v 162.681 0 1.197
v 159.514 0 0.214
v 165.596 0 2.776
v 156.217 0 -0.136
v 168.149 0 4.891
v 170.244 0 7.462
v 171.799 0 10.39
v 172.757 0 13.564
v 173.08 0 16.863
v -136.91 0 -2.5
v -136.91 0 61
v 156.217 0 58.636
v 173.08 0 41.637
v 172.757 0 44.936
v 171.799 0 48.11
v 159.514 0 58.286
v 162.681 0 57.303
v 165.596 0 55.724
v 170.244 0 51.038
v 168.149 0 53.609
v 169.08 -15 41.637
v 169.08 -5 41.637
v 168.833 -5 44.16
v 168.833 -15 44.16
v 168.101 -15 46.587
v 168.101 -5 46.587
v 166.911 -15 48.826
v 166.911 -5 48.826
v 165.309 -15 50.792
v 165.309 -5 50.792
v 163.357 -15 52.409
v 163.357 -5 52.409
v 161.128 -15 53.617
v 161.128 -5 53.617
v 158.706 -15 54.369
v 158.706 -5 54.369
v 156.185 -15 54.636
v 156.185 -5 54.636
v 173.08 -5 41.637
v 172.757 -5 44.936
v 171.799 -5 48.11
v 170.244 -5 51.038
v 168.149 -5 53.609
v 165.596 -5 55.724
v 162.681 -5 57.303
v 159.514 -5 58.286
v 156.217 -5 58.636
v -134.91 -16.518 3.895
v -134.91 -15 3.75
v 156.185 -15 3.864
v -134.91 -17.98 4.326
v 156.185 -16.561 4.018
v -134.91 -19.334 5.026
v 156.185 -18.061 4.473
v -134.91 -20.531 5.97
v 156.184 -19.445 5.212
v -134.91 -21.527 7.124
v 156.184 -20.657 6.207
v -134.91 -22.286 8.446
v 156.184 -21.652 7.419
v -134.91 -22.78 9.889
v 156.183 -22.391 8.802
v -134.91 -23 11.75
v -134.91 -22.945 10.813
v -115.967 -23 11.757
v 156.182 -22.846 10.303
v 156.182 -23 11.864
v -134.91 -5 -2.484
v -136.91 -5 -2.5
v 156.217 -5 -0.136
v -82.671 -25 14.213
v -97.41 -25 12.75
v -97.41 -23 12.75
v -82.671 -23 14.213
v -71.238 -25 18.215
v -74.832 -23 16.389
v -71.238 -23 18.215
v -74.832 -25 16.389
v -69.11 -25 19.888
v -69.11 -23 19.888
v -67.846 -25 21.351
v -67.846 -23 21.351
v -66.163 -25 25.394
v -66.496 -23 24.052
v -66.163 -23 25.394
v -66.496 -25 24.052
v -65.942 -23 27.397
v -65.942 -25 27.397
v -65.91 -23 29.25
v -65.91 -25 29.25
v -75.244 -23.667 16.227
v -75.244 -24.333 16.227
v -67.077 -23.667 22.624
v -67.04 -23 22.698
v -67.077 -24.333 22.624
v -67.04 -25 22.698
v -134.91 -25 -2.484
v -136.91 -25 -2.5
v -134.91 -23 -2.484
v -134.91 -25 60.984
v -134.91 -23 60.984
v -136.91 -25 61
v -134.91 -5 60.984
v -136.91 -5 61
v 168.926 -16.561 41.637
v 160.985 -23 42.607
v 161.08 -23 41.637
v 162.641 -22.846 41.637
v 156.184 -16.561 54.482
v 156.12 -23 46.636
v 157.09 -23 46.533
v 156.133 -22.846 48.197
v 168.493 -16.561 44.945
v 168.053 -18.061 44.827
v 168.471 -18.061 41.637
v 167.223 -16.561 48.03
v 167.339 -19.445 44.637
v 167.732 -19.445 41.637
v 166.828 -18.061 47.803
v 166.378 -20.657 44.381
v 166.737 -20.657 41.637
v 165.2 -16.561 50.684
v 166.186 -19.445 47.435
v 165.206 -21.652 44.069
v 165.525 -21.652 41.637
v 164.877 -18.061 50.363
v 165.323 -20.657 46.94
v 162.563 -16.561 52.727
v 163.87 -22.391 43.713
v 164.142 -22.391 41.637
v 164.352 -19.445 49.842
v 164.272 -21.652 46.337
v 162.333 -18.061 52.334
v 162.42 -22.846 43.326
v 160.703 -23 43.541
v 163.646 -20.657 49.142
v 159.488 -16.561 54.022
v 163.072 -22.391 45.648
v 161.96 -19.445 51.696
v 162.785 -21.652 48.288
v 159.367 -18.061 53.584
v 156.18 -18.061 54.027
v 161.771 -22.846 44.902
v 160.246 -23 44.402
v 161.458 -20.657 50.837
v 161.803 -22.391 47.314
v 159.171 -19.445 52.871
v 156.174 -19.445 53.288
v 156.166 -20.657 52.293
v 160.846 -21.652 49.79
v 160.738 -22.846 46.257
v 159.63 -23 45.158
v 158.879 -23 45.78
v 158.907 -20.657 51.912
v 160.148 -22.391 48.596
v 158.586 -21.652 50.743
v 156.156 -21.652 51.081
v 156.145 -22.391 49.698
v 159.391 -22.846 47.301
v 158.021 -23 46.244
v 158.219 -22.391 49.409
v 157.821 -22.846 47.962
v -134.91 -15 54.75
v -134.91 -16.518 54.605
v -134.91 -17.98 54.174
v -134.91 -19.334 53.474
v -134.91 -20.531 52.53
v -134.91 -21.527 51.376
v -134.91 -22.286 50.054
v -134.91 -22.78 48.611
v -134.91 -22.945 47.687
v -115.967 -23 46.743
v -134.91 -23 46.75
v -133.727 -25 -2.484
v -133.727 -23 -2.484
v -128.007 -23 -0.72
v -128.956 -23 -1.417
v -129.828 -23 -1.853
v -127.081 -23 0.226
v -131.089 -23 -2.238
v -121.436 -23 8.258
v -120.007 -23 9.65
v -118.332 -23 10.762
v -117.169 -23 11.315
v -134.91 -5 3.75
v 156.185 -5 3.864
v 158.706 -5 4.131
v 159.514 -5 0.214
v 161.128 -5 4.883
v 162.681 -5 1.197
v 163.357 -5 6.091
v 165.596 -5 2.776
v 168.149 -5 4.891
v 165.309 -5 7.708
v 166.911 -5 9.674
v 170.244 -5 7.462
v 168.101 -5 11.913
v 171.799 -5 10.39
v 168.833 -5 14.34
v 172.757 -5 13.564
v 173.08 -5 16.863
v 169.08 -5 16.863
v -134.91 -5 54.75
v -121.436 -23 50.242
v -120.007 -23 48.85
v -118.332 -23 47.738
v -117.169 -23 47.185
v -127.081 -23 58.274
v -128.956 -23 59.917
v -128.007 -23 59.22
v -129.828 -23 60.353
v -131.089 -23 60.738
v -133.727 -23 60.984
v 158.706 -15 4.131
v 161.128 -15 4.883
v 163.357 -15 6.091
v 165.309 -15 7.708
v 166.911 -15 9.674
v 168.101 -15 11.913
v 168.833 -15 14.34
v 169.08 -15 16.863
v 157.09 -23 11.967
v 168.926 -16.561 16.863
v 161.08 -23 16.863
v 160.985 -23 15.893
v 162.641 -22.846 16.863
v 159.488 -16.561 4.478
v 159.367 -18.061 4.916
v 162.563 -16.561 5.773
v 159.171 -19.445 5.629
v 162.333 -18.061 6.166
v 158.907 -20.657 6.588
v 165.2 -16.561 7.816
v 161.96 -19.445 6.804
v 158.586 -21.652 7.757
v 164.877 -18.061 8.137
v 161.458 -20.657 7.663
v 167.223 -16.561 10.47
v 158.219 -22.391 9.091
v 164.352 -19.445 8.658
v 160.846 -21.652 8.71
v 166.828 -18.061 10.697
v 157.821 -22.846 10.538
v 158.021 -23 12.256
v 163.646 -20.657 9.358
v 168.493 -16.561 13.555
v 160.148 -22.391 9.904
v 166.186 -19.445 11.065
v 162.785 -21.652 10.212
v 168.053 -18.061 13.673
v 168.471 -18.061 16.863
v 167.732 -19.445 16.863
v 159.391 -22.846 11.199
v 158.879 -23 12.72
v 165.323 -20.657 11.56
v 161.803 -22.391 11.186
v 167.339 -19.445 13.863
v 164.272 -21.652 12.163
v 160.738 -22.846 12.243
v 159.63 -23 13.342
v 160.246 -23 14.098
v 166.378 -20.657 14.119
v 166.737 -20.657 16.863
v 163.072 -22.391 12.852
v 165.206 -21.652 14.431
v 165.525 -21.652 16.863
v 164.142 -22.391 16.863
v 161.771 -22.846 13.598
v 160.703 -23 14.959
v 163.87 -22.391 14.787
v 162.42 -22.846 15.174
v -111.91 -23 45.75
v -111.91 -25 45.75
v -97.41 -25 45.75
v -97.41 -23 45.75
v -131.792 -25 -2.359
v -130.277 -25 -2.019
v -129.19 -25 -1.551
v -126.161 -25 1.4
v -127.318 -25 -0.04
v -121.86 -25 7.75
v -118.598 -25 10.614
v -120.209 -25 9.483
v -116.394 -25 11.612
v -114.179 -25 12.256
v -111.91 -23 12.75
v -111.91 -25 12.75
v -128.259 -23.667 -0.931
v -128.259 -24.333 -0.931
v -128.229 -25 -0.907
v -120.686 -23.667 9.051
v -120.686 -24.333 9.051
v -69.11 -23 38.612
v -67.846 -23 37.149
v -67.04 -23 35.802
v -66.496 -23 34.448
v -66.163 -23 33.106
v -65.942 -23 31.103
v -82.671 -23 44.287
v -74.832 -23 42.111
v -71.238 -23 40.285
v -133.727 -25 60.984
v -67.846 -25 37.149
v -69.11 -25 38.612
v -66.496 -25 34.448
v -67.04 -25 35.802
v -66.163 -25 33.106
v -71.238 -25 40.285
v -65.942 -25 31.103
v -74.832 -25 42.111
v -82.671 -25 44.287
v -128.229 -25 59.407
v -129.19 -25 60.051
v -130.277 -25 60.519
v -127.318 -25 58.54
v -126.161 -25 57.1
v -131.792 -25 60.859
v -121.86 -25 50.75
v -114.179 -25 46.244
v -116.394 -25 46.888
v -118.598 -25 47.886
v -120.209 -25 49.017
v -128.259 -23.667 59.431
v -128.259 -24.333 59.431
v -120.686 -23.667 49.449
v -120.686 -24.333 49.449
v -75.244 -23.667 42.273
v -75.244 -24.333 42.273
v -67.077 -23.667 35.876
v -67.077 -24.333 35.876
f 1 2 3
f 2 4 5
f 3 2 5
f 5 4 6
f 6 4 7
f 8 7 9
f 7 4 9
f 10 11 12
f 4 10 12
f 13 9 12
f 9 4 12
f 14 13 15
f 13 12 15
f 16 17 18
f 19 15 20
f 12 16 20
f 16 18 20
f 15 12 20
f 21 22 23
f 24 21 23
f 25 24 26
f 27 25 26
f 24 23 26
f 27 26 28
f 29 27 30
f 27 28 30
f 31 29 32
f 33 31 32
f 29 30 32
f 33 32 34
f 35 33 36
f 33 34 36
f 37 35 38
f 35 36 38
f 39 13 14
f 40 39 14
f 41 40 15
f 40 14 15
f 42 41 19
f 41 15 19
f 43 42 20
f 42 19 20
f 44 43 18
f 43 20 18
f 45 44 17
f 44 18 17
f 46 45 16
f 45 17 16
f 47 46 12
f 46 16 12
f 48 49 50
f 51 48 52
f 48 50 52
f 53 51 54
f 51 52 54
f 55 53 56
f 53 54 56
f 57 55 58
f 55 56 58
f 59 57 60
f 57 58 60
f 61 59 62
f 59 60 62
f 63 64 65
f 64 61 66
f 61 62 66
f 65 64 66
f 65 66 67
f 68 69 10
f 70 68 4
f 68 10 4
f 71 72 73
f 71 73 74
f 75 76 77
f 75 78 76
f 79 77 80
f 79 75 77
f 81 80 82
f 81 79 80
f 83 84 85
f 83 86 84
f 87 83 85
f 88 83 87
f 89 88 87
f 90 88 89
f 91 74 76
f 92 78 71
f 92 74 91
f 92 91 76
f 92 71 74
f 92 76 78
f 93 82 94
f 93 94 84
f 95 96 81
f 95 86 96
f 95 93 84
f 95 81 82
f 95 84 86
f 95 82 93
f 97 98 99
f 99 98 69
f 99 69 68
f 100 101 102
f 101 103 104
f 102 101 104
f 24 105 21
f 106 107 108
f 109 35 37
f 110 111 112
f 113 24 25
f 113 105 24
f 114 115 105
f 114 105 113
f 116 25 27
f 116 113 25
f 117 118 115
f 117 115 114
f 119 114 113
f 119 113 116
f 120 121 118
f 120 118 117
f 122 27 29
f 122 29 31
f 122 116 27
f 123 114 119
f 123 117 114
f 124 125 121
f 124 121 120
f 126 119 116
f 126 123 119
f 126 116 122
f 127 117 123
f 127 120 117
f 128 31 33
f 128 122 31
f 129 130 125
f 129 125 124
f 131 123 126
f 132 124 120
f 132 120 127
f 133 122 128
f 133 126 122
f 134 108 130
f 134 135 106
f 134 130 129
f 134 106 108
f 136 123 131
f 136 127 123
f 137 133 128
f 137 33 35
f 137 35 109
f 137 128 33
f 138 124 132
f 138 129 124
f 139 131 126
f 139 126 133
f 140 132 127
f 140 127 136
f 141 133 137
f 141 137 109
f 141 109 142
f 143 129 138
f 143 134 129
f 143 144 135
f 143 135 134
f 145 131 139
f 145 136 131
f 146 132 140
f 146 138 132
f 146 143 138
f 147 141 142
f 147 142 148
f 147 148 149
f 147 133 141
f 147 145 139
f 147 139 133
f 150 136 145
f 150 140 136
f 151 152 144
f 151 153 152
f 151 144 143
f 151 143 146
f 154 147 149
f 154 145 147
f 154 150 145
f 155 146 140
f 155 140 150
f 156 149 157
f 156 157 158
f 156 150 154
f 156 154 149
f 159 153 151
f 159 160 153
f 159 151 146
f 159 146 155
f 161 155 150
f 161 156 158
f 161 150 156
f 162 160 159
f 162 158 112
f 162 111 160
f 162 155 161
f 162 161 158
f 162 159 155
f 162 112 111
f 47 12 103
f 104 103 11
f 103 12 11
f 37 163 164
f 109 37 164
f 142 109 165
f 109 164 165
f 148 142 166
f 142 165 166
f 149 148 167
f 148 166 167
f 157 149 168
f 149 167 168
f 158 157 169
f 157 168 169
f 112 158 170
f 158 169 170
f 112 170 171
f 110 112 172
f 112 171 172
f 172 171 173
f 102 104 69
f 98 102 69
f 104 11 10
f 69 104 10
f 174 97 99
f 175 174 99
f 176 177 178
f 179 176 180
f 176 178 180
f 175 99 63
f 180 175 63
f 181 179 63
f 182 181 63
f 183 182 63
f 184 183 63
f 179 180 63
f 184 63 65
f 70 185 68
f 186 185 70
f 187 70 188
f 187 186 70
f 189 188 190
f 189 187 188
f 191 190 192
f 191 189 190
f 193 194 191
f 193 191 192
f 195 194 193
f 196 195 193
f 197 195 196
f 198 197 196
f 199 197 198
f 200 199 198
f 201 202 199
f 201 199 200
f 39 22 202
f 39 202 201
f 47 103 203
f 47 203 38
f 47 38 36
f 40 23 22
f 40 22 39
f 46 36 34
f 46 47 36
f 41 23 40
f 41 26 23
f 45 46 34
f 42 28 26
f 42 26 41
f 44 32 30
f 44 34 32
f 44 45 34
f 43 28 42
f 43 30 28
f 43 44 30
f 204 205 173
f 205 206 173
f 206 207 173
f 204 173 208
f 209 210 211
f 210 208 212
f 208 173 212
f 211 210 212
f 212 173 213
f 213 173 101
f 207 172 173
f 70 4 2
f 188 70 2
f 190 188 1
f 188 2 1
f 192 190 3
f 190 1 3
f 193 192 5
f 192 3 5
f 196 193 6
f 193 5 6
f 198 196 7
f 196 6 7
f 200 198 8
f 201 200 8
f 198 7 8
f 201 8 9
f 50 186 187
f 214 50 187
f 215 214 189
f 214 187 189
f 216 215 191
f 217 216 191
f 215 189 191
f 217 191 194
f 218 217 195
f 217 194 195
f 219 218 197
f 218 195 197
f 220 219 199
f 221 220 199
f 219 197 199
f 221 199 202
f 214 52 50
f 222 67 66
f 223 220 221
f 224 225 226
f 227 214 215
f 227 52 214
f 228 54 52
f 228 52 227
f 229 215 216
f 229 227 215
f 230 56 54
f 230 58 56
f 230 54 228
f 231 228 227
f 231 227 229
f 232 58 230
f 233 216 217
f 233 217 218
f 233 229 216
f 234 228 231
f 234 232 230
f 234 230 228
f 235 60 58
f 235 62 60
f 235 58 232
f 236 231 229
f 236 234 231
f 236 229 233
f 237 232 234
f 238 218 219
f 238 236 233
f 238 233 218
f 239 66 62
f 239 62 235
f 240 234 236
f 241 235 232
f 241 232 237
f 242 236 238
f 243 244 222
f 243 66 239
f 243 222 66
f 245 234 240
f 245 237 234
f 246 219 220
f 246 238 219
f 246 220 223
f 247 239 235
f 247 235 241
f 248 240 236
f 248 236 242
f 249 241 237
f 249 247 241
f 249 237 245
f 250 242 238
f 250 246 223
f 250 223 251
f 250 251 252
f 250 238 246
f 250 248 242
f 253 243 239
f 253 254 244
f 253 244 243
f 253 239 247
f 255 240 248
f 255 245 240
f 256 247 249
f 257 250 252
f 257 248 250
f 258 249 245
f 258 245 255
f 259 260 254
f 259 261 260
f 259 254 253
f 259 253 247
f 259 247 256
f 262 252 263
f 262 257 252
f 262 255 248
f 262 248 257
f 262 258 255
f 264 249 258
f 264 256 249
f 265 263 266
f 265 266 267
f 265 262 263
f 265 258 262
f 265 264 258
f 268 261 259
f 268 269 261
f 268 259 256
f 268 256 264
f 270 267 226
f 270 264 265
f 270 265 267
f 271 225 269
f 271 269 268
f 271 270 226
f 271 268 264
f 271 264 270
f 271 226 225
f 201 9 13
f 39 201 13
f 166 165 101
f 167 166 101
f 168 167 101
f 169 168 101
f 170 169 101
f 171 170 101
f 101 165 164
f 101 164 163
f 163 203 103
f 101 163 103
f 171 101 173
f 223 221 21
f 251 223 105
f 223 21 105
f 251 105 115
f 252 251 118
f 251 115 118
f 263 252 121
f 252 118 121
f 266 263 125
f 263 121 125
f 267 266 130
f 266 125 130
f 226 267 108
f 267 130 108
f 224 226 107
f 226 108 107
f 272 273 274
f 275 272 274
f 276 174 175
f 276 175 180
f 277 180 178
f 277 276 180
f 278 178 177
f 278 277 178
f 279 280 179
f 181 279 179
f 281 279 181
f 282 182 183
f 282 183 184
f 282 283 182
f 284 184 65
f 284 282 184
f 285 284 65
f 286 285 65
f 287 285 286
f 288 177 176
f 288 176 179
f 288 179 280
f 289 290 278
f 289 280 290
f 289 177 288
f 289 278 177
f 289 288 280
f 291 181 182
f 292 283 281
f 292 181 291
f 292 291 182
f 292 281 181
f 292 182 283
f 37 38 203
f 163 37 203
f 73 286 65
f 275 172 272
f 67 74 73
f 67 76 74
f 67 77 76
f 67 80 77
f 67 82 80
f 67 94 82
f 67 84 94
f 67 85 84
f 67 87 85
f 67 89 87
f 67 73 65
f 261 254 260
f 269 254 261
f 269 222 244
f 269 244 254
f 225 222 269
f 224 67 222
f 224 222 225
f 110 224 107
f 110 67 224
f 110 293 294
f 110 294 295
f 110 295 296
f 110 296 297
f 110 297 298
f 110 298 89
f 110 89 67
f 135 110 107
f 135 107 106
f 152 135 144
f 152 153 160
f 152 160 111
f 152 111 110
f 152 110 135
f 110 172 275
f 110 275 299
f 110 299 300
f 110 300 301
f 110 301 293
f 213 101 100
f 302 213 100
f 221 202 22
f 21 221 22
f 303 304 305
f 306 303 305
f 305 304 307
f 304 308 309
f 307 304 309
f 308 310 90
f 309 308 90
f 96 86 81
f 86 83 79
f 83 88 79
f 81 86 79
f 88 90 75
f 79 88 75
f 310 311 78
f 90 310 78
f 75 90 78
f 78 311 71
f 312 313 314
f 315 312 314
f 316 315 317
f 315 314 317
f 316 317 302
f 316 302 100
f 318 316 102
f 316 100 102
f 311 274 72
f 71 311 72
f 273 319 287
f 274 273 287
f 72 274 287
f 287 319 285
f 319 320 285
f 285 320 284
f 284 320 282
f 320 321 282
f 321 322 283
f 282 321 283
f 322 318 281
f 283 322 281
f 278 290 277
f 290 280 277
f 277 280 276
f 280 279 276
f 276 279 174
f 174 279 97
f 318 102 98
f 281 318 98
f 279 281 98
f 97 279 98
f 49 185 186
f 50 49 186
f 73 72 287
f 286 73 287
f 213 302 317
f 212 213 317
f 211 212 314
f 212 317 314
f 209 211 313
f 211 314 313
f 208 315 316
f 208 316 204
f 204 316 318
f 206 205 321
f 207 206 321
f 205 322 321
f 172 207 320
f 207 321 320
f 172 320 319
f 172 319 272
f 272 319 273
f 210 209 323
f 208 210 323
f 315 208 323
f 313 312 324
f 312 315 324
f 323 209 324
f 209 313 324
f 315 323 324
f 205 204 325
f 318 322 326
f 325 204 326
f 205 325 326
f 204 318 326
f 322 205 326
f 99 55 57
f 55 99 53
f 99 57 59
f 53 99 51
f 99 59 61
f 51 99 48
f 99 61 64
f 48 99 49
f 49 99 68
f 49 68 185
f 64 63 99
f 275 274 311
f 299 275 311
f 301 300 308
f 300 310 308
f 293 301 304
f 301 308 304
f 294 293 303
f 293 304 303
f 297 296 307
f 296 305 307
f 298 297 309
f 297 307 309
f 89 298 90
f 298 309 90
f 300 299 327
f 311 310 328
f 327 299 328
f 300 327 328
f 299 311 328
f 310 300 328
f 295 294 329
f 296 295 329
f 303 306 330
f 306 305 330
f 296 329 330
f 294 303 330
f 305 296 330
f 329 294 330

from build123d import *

# Parameters (mm, degrees)
F1_DEPTH  = 5
F3_DEPTH  = 18
F4_R      = 8
F6_DEPTH  = 20
F8_DEPTH  = 69
F10_DEPTH = 2


with BuildPart() as f1:
    # F0 (on Front) → F1 (new body)
    with BuildSketch(Plane.XZ):
        with BuildLine():
            Line((-136.909834867, 61), (-136.909834867, -2.5))
            Line((-136.909834867, -2.5), (156.2171810981, -0.1359955775))
            ThreePointArc((156.2171810981, -0.1359955775), (168.1492733016, 4.8912054731), (173.0800843239, 16.863451604))
            Line((173.0800843239, 16.863451604), (173.0800843239, 41.636548396))
            ThreePointArc((173.0800843239, 41.636548396), (168.1492733016, 53.6087945269), (156.2171810981, 58.6359955775))
            Line((156.2171810981, 58.6359955775), (-136.909834867, 61))
        make_face()
    extrude(amount=F1_DEPTH)

    # F2 (on face) → F3 (join)
    with BuildSketch(Plane.XZ.offset(5)):
        with BuildLine():
            Line((169.0800786018, 16.863451604), (169.0800786018, 41.636548396))
            ThreePointArc((169.0800786018, 41.636548396), (165.309460068, 50.7917914076), (156.1849229874, 54.6361199305))
            Line((156.1849229874, 54.6361199305), (-134.909838438, 54.75))
            Line((-134.909838438, 54.75), (-134.909838438, 3.75))
            Line((-134.909838438, 3.75), (156.1849229874, 3.8638800695))
            ThreePointArc((156.1849229874, 3.8638800695), (165.309460068, 7.7082085924), (169.0800786018, 16.863451604))
        make_face()
    extrude(amount=F3_DEPTH)

    # F4
    f4_edges = [f1.edges().sort_by_distance(p)[0] for p in [
        (10.637542, -23, 54.69306),
        (165.30946, -23, 50.791791),
        (169.080079, -23, 29.25),
        (165.30946, -23, 7.708209),
        (10.637542, -23, 3.80694),
    ]]
    fillet(f4_edges, radius=F4_R)

    # F5 (on face) → F6 (join)
    with BuildSketch(Plane.XZ.offset(5)):
        Polygon((-134.909838438, 3.75), (-134.909838438, 54.75), (-134.909838438, 60.983870472), (-136.909834867, 61), (-136.909834867, -2.5), (-134.909838438, -2.483870472), align=None)
    extrude(amount=F6_DEPTH)

    # F7 (on face) → F8 (join)
    with BuildSketch(Plane.YZ.offset(-134.909838438)):
        Polygon((-25, 60.983870472), (-25, -2.483870472), (-23, -2.483870472), (-23, 11.7500006122), (-23, 46.7499993878), (-23, 60.983870472), align=None)
    extrude(amount=F8_DEPTH)

    # F9 (on face) → F10 (cut)
    with BuildSketch(Plane.XZ.offset(25)):
        with BuildLine():
            Line((-65.909838438, -2.483870472), (-65.909838438, 29.25))
            add(Edge.make_bspline(
                [(-97.409834867, 12.75), (-65.909838438, 13.8700312972), (-65.9114625472, 23.4057943523), (-65.909838438, 29.25)],
                knots=[0, 0, 0, 0, 35.5598056101, 35.5598056101, 35.5598056101, 35.5598056101], degree=3))
            Line((-97.409834867, 12.75), (-111.909834867, 12.75))
            add(Edge.make_bspline(
                [(-133.7268669105, -2.483870472), (-131.7941304161, -2.4585653704), (-126.820763516, -1.9012974431), (-121.7865199651, 10.7168586647), (-115.048285193, 12.1039418314), (-111.909834867, 12.75)],
                knots=[0.04781603, 0.04781603, 0.04781603, 0.04781603, 0.2828665478, 0.6659825914, 1, 1, 1, 1], degree=3))
            Line((-133.7268669105, -2.483870472), (-65.909838438, -2.483870472))
        make_face()
        with BuildLine():
            Line((-65.909838438, 60.983870472), (-133.7268669105, 60.983870472))
            add(Edge.make_bspline(
                [(-133.7268669105, 60.983870472), (-131.7941304161, 60.9585653704), (-126.820763516, 60.4012974431), (-121.7865199651, 47.7831413353), (-115.048285193, 46.3960581686), (-111.909834867, 45.75)],
                knots=[0.04781603, 0.04781603, 0.04781603, 0.04781603, 0.2828665478, 0.6659825914, 1, 1, 1, 1], degree=3))
            Line((-111.909834867, 45.75), (-97.409834867, 45.75))
            add(Edge.make_bspline(
                [(-97.409834867, 45.75), (-65.909838438, 44.6299687028), (-65.9114625472, 35.0942056477), (-65.909838438, 29.25)],
                knots=[0, 0, 0, 0, 35.5598056101, 35.5598056101, 35.5598056101, 35.5598056101], degree=3))
            Line((-65.909838438, 29.25), (-65.909838438, 60.983870472))
        make_face()
    extrude(amount=-F10_DEPTH, mode=Mode.SUBTRACT)


solid = f1.part
